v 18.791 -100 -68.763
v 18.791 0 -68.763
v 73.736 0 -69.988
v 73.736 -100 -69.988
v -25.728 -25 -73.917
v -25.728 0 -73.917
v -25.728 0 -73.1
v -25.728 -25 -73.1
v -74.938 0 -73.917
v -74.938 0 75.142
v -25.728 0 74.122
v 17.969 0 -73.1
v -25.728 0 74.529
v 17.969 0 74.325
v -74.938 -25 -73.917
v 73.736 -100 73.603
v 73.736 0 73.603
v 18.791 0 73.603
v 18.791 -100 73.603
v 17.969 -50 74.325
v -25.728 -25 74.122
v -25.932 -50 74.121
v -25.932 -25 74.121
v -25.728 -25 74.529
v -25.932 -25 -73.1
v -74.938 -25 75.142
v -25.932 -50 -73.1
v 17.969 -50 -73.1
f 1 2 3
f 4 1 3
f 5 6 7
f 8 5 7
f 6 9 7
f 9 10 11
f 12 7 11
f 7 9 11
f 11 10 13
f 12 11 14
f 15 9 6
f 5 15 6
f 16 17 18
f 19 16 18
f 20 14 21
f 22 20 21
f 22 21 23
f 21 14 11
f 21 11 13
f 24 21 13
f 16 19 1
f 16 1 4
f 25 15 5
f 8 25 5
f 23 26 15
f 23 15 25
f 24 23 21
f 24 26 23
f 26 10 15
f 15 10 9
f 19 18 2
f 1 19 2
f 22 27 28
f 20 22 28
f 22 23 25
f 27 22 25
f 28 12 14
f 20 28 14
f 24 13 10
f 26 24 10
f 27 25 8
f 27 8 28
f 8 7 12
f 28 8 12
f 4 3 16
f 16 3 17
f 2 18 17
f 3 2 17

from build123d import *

# Parameters (mm, degrees)
F3_DEPTH = 25
F4_DEPTH = 50
F5_DEPTH = 100


with BuildPart() as f3:
    # F0 (on Front) → F3 (new body)
    with BuildSketch(Plane.XZ):
        Polygon((-25.727972, 74.52938), (-74.937776, 75.141951), (-74.937776, -73.916793), (-25.727972, -73.916793), align=None)
    extrude(amount=F3_DEPTH)

    # F1 (on Front) → F4 (join)
    with BuildSketch(Plane.XZ):
        Polygon((17.968714, 74.325189), (-25.932163, 74.120998), (-25.932163, -73.10003), (17.968714, -73.10003), align=None)
    extrude(amount=F4_DEPTH)


with BuildPart() as f5:
    # F2 (on Front) → F5 (new body)
    with BuildSketch(Plane.XZ):
        Polygon((18.791407, 73.602609), (18.791407, -68.762794), (73.735863, -69.988325), (73.735863, 73.602609), align=None)
    extrude(amount=F5_DEPTH)


solid = Compound([f3.part, f5.part])
